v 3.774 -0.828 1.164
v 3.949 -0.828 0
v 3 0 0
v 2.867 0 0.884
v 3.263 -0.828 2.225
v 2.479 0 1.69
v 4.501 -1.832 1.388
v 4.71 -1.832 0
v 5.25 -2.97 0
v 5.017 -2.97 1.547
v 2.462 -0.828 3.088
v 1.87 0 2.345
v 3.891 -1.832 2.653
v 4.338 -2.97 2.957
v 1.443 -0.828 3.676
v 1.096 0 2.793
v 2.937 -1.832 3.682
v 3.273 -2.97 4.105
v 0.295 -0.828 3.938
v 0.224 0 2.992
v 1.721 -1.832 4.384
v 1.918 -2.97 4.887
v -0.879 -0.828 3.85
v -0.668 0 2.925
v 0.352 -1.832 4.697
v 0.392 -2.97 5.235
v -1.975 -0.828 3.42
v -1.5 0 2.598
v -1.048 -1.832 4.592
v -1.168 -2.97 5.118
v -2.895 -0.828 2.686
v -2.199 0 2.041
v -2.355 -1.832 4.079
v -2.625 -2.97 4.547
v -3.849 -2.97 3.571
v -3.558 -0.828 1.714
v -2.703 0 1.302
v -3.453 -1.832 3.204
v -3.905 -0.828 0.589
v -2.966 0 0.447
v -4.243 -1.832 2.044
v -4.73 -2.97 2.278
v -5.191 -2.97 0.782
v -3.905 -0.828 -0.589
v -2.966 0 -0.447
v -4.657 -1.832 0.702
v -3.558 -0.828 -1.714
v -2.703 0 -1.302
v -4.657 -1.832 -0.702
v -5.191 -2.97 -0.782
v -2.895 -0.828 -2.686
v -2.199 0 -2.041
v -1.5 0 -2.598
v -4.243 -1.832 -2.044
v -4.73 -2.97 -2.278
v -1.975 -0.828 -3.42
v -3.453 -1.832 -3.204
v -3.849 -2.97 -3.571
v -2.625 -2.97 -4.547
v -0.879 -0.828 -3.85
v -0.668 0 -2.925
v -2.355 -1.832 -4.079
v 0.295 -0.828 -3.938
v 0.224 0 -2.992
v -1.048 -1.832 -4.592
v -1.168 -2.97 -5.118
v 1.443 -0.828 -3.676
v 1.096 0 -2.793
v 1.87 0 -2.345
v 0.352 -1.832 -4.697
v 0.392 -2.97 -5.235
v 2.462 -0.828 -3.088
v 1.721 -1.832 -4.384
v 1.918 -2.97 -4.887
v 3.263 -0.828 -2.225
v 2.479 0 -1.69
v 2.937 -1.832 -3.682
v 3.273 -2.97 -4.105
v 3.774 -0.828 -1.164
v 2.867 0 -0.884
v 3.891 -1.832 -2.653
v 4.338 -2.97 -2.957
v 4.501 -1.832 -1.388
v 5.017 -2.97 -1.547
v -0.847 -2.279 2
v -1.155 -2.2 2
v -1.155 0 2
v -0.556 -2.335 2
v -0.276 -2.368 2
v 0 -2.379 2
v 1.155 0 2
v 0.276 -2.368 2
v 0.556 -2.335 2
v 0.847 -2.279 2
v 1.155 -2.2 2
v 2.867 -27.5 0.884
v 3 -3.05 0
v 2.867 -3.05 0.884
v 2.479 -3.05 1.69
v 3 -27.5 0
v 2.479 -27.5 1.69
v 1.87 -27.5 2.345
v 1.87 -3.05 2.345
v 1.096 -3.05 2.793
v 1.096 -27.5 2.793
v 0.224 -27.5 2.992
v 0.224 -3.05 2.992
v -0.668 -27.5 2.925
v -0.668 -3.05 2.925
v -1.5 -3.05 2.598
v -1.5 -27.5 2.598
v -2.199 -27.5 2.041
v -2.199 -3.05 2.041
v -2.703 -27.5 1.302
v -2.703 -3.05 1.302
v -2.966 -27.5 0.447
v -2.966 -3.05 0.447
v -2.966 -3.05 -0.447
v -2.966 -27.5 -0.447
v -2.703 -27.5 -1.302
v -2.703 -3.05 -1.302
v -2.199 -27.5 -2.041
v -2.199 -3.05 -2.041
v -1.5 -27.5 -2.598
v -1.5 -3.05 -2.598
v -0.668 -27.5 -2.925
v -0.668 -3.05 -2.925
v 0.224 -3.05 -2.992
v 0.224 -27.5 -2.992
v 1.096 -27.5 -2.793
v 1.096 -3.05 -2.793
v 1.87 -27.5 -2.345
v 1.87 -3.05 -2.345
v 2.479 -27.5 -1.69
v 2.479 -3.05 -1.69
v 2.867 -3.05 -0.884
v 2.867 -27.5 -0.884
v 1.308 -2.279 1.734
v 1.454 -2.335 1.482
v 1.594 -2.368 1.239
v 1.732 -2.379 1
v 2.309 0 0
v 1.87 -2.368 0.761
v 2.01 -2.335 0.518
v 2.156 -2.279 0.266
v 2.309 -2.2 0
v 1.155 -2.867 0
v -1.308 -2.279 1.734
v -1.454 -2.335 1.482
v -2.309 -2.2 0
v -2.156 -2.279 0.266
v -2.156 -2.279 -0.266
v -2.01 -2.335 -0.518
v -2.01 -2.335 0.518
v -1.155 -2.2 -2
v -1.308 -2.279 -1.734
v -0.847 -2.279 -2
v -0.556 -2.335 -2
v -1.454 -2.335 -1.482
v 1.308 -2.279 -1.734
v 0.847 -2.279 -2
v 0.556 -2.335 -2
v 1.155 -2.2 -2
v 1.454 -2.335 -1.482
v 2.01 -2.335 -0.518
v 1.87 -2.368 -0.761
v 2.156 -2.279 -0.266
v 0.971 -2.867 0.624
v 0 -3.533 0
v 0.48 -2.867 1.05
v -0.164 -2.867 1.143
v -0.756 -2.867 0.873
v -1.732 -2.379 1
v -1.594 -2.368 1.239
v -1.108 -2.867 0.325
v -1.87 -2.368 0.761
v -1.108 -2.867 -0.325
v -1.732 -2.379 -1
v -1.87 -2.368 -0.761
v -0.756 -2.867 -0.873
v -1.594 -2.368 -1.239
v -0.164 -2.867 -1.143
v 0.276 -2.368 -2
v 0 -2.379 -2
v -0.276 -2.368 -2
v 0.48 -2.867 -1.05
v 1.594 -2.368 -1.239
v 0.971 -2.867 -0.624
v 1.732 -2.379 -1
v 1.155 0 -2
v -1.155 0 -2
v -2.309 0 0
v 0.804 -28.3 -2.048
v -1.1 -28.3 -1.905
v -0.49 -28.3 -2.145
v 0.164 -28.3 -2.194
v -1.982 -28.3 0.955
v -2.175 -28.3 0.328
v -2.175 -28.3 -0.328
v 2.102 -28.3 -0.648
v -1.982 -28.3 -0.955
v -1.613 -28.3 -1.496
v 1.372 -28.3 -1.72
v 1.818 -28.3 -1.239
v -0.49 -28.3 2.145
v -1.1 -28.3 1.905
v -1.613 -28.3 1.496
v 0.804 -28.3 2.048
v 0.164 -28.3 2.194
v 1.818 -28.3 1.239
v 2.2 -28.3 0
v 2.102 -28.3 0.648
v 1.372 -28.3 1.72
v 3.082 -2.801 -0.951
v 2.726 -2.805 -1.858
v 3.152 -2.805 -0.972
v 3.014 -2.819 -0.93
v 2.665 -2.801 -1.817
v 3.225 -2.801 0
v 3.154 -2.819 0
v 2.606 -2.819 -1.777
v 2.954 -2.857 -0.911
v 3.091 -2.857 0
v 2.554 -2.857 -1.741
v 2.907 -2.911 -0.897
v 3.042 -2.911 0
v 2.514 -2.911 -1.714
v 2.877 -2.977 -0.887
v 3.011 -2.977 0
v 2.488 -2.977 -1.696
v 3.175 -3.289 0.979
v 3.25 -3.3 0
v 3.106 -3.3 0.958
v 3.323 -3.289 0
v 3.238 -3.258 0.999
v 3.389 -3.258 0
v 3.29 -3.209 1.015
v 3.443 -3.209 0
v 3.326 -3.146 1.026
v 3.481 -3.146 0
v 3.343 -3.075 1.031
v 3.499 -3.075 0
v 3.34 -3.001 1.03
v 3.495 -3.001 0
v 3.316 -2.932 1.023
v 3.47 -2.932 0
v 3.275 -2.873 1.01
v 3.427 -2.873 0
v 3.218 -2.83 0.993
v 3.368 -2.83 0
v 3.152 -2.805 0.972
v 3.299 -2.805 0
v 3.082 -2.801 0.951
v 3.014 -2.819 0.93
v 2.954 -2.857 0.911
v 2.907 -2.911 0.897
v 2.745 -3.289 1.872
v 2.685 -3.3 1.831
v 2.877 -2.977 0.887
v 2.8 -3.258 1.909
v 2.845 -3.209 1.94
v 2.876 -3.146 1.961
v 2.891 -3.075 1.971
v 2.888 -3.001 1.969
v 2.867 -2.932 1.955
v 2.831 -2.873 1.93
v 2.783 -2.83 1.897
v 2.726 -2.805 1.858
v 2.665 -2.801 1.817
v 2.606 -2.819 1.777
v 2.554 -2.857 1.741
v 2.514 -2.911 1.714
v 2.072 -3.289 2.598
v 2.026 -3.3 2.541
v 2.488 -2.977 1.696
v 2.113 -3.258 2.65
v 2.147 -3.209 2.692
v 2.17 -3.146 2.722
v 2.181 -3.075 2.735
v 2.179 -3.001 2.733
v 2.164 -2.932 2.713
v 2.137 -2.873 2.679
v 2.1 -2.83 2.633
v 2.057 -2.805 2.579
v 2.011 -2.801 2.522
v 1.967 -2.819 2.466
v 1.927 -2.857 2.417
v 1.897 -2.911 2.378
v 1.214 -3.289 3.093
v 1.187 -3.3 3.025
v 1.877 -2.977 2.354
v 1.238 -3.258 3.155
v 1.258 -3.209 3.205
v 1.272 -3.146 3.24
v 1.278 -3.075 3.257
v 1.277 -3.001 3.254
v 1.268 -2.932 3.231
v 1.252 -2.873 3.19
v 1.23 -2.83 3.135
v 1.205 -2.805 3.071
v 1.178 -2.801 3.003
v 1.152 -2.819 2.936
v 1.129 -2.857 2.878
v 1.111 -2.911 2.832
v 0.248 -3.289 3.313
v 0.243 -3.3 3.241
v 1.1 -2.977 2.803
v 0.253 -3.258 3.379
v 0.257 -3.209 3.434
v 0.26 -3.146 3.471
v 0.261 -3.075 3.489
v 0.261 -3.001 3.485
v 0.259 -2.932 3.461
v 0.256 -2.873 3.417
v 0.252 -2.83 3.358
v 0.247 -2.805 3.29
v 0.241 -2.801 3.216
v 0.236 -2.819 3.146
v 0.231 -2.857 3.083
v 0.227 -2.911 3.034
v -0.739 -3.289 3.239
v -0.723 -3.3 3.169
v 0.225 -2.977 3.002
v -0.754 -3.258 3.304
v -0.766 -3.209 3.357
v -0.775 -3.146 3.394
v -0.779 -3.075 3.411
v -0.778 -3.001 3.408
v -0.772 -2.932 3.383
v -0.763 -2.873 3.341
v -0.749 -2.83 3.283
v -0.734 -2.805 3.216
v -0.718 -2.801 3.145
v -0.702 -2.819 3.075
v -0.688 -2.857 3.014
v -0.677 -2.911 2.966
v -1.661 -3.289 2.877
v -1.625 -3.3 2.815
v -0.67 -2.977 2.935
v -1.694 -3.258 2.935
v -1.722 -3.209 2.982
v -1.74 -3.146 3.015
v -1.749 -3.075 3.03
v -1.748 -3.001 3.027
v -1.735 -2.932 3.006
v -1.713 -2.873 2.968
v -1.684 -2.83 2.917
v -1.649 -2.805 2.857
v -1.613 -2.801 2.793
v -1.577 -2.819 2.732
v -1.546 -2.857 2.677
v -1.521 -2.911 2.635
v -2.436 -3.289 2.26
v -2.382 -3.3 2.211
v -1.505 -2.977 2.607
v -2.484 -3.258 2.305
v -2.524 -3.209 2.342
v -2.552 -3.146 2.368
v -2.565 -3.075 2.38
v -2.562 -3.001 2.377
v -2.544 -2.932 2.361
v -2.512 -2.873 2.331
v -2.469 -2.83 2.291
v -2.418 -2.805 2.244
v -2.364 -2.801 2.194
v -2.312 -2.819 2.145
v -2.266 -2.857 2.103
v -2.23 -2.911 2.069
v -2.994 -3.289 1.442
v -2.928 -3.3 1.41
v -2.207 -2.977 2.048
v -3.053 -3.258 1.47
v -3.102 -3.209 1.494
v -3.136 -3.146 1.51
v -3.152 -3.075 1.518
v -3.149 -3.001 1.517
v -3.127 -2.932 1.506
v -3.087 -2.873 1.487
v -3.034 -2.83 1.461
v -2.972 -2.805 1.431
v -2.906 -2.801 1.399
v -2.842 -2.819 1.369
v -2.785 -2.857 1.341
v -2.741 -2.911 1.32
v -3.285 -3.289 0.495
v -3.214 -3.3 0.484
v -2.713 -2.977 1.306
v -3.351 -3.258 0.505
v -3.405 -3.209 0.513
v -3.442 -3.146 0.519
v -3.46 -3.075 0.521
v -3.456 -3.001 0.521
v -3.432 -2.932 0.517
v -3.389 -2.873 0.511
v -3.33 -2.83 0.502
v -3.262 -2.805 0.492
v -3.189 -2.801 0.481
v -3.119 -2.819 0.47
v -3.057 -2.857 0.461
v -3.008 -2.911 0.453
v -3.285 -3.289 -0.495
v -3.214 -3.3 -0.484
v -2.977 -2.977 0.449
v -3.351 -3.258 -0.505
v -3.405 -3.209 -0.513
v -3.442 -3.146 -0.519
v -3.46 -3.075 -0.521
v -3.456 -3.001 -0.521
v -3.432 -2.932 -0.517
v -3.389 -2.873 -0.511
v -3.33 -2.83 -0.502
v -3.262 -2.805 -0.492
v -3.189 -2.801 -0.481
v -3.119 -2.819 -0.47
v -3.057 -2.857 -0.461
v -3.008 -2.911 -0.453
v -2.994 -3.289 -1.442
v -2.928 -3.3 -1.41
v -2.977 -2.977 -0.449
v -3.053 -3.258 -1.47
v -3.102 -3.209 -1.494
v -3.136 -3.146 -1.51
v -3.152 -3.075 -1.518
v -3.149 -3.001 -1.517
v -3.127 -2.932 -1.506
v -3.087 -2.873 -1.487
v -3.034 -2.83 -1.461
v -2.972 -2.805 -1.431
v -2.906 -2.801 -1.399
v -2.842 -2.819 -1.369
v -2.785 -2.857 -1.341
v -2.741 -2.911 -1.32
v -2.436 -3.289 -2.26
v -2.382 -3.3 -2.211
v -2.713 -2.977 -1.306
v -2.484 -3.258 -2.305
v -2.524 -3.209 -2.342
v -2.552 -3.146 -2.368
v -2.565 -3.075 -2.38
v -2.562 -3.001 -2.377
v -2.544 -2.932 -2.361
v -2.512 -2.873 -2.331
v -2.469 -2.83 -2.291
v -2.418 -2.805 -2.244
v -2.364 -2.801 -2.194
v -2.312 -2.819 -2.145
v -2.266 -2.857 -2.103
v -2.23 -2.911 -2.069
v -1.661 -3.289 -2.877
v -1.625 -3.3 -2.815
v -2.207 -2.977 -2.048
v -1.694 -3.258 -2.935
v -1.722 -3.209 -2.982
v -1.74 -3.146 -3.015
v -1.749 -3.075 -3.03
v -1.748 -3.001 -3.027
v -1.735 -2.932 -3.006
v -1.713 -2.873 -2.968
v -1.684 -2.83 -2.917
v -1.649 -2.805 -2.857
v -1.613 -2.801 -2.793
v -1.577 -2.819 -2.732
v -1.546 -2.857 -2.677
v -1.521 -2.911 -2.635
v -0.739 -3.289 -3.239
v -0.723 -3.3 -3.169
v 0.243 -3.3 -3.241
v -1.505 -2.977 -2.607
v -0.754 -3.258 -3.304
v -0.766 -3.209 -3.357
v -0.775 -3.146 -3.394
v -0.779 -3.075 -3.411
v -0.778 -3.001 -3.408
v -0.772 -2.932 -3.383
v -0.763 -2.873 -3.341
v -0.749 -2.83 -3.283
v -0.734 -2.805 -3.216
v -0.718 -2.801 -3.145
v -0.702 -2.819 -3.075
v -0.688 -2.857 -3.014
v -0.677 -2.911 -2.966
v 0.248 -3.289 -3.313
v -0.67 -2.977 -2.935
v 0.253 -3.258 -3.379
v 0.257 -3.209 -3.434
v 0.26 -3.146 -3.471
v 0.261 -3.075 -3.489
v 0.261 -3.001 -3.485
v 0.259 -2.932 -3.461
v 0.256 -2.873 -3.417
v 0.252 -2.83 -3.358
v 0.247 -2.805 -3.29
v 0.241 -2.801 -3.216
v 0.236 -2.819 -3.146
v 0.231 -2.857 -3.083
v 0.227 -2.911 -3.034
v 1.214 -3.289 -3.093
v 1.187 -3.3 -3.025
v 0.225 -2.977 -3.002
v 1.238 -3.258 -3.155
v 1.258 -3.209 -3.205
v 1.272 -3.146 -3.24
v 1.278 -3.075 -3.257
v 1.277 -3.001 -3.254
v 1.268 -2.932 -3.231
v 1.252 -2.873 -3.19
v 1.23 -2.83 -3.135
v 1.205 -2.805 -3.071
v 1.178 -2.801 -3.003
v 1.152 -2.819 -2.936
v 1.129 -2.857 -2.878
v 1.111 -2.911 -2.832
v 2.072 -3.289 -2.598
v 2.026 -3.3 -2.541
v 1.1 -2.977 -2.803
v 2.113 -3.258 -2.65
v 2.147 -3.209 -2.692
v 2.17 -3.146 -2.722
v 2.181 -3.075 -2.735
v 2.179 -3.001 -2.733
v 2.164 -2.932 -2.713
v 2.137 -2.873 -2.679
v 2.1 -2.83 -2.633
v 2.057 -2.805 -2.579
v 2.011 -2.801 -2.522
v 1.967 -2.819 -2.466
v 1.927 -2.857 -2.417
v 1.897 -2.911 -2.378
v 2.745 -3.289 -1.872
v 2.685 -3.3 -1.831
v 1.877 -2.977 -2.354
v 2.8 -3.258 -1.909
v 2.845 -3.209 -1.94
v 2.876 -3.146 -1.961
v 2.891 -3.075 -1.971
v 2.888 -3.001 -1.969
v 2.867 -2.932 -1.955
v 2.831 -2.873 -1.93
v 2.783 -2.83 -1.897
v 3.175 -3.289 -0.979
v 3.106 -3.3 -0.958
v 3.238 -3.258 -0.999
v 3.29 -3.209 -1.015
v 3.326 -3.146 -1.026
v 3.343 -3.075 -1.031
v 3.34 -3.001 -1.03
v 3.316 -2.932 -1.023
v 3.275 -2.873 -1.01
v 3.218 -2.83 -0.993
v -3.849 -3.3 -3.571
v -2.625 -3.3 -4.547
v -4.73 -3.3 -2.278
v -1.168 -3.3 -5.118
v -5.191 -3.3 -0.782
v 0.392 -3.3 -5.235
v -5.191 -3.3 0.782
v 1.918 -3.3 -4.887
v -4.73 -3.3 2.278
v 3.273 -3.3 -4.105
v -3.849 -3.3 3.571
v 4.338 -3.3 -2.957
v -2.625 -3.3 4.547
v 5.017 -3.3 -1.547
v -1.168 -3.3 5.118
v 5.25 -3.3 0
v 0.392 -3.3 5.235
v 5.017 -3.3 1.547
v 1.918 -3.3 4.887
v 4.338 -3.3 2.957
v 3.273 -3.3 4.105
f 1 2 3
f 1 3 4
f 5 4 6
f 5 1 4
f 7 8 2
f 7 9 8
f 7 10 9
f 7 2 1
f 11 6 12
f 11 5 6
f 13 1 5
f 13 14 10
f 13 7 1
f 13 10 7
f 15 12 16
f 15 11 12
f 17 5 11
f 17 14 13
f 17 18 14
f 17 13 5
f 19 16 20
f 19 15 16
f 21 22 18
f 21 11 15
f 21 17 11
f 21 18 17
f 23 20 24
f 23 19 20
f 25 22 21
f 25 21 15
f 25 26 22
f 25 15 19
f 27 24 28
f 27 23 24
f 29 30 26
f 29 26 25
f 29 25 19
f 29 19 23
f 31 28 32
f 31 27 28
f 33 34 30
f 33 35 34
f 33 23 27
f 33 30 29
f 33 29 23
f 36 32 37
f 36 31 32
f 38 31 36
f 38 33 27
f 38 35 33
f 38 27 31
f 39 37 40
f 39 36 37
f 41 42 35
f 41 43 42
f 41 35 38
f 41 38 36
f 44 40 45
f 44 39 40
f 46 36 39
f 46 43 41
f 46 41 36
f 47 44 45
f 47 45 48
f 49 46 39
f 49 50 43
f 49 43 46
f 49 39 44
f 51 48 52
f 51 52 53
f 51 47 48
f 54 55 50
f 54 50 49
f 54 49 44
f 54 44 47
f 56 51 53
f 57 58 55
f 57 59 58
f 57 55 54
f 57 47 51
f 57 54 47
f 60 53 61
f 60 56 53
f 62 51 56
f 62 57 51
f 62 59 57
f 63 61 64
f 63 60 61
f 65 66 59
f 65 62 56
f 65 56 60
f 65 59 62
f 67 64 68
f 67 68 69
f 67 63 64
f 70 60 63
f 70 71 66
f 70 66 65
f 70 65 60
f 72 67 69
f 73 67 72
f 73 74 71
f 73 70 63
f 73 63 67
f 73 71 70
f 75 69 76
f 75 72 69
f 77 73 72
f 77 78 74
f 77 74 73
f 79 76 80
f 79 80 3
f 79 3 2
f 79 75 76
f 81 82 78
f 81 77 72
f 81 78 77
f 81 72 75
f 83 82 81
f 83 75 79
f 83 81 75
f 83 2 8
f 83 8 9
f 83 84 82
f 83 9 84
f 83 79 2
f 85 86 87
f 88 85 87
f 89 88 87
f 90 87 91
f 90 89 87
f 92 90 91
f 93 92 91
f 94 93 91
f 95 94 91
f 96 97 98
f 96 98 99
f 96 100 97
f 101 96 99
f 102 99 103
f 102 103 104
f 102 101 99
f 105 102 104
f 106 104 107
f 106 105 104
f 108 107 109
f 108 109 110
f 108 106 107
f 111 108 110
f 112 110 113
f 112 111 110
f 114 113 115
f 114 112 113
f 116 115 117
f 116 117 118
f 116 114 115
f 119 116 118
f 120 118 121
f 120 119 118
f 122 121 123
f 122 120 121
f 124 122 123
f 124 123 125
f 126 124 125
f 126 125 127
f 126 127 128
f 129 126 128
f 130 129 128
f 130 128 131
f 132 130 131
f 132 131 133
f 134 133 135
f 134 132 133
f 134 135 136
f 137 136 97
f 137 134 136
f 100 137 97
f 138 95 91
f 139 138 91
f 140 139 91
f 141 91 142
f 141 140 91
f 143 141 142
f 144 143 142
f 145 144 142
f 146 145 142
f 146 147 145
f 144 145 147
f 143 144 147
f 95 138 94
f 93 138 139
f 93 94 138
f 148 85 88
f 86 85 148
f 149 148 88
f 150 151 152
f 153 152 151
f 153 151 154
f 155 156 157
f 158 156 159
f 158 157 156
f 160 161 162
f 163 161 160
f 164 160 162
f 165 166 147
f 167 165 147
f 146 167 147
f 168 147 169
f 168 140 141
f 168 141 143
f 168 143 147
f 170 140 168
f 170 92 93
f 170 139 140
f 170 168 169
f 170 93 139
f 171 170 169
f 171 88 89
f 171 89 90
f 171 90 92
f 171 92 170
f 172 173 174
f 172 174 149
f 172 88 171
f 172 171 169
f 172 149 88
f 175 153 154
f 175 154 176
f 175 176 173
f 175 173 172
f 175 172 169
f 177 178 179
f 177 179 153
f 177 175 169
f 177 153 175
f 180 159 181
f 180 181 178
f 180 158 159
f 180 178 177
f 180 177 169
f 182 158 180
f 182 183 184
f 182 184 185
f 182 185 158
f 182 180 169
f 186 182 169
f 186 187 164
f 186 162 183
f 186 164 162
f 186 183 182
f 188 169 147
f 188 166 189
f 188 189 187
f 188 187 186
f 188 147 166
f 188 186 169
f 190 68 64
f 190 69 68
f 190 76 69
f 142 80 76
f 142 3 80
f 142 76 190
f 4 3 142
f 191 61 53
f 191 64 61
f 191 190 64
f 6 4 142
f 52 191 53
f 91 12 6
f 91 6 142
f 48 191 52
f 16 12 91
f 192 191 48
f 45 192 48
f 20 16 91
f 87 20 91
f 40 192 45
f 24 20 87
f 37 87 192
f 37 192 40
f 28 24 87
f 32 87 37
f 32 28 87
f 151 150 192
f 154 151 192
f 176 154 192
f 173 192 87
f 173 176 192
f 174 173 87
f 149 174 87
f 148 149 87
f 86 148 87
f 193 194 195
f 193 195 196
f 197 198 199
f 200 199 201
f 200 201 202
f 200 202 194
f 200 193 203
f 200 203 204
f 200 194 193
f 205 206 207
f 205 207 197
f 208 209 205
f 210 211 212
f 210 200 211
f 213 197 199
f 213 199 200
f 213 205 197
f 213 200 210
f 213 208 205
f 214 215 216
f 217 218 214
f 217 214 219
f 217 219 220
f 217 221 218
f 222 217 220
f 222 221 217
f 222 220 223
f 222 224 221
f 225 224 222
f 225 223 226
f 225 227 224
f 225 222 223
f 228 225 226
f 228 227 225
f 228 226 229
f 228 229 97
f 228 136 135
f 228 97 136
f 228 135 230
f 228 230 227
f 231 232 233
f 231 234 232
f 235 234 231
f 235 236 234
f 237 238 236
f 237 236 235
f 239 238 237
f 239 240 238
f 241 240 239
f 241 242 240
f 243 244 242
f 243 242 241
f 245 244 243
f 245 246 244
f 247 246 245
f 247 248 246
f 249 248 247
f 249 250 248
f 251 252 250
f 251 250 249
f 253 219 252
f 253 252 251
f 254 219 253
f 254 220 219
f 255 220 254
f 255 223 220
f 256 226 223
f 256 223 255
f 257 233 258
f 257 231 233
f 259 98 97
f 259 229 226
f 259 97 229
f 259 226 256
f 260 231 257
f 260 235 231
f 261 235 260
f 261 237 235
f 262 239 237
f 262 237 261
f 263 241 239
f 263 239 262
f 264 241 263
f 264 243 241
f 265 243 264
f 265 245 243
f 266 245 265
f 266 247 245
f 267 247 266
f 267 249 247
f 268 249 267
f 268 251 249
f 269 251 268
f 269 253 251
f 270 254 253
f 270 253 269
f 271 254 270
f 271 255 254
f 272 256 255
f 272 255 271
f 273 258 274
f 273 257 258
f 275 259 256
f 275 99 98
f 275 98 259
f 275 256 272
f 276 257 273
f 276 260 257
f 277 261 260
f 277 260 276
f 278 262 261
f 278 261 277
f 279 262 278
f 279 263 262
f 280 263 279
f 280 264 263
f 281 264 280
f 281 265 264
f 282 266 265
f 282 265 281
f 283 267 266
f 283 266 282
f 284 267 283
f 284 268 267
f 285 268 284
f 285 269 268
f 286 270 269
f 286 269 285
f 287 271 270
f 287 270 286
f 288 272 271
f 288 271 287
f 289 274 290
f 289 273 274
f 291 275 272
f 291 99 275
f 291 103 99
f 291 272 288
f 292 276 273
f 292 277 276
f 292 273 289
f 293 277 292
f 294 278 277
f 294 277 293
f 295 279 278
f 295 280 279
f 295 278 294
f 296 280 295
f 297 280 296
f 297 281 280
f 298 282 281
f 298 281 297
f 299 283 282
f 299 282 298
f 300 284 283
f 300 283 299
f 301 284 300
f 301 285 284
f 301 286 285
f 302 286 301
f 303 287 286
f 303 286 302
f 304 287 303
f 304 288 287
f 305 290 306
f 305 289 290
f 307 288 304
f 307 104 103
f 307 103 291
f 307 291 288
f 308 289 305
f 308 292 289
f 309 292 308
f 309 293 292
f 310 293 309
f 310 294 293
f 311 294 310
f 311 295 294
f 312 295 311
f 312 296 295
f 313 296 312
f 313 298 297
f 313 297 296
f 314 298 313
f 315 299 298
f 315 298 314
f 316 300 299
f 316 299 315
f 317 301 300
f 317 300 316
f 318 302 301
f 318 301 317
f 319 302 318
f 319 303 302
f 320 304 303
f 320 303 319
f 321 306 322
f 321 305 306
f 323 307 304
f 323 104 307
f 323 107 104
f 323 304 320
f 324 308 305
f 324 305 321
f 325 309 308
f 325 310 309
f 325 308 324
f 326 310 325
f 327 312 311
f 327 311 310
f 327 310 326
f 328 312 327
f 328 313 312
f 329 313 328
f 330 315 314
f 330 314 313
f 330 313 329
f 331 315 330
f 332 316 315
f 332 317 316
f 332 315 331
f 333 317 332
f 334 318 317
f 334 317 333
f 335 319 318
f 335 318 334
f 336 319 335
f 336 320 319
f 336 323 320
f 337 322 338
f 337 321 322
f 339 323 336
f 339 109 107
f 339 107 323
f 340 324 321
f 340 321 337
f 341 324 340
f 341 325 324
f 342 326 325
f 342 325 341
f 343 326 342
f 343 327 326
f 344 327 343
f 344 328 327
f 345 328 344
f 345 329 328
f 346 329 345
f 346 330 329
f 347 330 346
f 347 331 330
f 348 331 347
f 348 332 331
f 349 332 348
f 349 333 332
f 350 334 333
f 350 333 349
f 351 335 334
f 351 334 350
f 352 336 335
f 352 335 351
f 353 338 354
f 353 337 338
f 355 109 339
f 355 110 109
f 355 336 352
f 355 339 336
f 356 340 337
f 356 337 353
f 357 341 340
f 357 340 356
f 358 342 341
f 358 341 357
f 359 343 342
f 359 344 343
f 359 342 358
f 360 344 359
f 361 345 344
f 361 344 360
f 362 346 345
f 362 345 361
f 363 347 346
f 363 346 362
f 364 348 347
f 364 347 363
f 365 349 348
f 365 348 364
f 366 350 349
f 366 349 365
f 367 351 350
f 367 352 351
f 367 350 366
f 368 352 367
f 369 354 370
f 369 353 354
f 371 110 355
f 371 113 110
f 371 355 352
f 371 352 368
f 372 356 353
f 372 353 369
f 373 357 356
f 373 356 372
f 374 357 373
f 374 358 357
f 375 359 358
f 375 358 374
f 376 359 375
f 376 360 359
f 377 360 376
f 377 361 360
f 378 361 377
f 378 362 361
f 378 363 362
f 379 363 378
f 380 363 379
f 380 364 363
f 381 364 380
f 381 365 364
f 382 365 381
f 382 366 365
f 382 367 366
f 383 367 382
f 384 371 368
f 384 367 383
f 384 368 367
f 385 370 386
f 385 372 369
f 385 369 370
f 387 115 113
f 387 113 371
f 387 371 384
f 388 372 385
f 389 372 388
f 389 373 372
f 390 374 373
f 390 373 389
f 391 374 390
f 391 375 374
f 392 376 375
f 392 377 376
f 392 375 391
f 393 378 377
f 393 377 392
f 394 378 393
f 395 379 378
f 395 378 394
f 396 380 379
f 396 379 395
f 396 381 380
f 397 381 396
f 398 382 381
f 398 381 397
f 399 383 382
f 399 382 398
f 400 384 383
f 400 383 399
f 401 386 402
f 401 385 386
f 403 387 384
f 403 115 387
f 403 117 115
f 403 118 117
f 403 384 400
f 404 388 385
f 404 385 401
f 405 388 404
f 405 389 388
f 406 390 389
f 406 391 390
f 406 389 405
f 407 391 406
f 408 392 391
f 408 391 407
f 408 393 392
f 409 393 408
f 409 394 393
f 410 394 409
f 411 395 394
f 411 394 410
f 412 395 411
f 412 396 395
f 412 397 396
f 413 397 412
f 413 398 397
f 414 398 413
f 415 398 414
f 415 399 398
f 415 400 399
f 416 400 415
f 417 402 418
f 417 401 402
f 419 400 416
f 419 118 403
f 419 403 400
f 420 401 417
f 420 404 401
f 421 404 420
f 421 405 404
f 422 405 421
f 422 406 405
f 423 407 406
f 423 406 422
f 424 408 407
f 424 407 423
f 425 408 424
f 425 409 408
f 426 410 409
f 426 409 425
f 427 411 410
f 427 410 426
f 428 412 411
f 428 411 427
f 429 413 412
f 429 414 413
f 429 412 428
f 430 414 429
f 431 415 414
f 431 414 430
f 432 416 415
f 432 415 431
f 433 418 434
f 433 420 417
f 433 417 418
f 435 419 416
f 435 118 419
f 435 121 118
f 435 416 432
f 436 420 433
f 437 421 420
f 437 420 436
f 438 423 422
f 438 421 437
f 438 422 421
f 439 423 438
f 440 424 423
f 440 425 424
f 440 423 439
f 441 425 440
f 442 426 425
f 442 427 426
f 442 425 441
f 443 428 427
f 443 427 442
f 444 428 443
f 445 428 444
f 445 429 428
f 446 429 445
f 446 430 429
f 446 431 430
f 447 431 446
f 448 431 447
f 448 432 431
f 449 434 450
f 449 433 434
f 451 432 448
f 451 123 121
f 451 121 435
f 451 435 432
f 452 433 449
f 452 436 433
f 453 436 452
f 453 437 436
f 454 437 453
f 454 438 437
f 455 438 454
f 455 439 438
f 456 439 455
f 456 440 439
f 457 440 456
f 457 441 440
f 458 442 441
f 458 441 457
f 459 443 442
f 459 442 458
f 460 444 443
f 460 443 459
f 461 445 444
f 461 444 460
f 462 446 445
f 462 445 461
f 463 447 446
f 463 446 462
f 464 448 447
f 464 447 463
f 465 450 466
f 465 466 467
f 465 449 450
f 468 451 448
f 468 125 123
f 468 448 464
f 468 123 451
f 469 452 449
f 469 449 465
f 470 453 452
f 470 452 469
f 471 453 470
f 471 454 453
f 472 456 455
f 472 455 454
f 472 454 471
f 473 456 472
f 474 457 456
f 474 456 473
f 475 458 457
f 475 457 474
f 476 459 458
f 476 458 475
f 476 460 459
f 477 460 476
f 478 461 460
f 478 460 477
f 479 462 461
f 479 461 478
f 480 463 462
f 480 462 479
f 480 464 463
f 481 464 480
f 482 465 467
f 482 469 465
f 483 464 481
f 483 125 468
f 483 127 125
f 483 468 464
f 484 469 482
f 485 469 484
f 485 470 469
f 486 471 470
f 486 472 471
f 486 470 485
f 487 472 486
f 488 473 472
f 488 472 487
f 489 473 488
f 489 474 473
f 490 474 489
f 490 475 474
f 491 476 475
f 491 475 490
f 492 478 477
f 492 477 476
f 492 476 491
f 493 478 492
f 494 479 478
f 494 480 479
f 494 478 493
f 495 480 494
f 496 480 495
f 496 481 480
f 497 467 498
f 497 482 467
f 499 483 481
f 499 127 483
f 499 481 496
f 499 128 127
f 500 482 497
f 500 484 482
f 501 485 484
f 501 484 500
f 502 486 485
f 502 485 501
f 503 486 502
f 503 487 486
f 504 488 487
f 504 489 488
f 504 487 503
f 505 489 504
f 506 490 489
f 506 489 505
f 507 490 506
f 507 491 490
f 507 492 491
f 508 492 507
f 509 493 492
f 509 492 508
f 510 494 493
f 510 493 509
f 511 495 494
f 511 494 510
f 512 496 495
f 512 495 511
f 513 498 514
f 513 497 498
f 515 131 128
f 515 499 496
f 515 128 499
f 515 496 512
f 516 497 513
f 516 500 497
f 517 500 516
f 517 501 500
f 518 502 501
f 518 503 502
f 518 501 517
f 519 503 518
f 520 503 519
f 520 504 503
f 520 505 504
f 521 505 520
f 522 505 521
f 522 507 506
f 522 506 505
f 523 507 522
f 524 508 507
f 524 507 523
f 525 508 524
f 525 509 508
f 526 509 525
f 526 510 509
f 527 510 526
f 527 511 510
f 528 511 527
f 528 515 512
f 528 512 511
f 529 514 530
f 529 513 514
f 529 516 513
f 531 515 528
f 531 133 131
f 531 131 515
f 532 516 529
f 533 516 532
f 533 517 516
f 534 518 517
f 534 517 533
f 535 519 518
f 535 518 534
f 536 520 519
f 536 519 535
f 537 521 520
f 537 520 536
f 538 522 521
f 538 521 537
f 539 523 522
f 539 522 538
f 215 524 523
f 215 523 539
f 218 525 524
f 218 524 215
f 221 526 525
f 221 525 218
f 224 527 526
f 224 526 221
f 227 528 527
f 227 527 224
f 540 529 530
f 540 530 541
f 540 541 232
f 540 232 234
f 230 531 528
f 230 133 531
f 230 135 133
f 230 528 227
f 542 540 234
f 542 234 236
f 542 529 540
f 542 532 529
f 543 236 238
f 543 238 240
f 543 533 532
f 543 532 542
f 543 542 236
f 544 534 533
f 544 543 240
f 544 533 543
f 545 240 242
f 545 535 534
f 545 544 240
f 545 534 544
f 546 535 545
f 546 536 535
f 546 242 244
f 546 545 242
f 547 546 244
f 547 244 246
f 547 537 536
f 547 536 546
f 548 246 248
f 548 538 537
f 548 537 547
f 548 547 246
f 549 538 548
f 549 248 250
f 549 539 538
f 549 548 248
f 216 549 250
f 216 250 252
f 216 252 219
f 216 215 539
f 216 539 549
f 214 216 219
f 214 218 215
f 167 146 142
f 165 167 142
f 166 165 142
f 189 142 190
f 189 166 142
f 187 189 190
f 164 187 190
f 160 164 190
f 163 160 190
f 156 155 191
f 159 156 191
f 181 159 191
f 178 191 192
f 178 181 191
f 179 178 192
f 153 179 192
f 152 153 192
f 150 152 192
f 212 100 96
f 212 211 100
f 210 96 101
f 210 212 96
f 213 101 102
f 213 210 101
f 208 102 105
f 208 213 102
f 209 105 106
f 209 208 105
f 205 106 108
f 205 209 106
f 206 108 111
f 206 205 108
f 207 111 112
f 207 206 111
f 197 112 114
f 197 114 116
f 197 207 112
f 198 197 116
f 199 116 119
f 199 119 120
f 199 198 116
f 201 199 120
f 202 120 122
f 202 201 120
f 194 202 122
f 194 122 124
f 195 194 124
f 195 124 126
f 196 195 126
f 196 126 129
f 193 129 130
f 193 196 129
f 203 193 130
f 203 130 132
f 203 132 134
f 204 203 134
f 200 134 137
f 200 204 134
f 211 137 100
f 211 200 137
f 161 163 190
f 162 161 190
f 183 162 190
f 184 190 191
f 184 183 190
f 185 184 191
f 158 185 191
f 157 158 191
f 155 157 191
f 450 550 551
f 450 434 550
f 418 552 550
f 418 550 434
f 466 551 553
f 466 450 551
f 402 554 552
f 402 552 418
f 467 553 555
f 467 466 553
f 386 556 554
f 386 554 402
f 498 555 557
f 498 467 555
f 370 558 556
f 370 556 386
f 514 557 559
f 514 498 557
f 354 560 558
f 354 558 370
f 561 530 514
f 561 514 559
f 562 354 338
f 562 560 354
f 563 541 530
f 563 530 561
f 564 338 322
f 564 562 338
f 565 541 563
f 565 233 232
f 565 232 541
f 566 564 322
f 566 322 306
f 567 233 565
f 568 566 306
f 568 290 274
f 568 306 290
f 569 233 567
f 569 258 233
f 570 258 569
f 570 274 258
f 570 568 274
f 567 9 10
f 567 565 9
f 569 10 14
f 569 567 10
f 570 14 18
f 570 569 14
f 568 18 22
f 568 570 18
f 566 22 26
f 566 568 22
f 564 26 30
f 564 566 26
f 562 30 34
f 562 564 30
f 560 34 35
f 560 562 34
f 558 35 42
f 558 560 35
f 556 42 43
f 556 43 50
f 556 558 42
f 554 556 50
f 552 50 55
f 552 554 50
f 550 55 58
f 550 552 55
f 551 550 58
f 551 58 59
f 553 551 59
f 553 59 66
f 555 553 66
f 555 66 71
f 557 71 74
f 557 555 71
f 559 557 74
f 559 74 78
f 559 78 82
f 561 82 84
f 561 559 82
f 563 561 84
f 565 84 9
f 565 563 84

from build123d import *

# Parameters (mm, degrees)
Y_KSEKLIK_EKSTR_ZYON1_START = -2.378633
IZIM2_R                     = 3
Y_KSEKLIK_EKSTR_ZYON1_DEPTH = 2.378633


with BuildPart() as part:
    # Çizim1 → Döndür1 (revolve)
    with BuildSketch(Plane.XY):
        with BuildLine():
            Line((2.309401077, 0), (3, 0))
            ThreePointArc((3, 0), (4.355337259, -1.310502077), (5.25, -2.97))
            Line((5.25, -2.97), (5.25, -3.3))
            Line((5.25, -3.3), (3.25, -3.3))
            ThreePointArc((3.25, -3.3), (3.426776695, -2.873223305), (3, -3.05))
            Line((3, -3.05), (3, -27.5))
            Line((3, -27.5), (2.2, -28.3))
            Line((2.2, -28.3), (0, -28.3))
            Line((0, -28.3), (0, -3.533333333))
            Line((0, -3.533333333), (2.309401077, -2.2))
            Line((2.309401077, -2.2), (2.309401077, 0))
        make_face()
    revolve(axis=Axis((0, -3.533333333, 0), (0, -1, 0)))

    # Çizim2 → Yükseklik-Ekstrüzyon1 (add)
    with BuildSketch(Plane(origin=(0, 0, 0), x_dir=(1, 0, 0), z_dir=(0, 1, 0)).offset(Y_KSEKLIK_EKSTR_ZYON1_START)):
        Circle(IZIM2_R)
        Polygon((2.309401077, 0), (1.154700538, 2), (-1.154700538, 2), (-2.309401077, 0), (-1.154700538, -2), (1.154700538, -2), align=None, mode=Mode.SUBTRACT)
    extrude(amount=Y_KSEKLIK_EKSTR_ZYON1_DEPTH)


solid = part.part
